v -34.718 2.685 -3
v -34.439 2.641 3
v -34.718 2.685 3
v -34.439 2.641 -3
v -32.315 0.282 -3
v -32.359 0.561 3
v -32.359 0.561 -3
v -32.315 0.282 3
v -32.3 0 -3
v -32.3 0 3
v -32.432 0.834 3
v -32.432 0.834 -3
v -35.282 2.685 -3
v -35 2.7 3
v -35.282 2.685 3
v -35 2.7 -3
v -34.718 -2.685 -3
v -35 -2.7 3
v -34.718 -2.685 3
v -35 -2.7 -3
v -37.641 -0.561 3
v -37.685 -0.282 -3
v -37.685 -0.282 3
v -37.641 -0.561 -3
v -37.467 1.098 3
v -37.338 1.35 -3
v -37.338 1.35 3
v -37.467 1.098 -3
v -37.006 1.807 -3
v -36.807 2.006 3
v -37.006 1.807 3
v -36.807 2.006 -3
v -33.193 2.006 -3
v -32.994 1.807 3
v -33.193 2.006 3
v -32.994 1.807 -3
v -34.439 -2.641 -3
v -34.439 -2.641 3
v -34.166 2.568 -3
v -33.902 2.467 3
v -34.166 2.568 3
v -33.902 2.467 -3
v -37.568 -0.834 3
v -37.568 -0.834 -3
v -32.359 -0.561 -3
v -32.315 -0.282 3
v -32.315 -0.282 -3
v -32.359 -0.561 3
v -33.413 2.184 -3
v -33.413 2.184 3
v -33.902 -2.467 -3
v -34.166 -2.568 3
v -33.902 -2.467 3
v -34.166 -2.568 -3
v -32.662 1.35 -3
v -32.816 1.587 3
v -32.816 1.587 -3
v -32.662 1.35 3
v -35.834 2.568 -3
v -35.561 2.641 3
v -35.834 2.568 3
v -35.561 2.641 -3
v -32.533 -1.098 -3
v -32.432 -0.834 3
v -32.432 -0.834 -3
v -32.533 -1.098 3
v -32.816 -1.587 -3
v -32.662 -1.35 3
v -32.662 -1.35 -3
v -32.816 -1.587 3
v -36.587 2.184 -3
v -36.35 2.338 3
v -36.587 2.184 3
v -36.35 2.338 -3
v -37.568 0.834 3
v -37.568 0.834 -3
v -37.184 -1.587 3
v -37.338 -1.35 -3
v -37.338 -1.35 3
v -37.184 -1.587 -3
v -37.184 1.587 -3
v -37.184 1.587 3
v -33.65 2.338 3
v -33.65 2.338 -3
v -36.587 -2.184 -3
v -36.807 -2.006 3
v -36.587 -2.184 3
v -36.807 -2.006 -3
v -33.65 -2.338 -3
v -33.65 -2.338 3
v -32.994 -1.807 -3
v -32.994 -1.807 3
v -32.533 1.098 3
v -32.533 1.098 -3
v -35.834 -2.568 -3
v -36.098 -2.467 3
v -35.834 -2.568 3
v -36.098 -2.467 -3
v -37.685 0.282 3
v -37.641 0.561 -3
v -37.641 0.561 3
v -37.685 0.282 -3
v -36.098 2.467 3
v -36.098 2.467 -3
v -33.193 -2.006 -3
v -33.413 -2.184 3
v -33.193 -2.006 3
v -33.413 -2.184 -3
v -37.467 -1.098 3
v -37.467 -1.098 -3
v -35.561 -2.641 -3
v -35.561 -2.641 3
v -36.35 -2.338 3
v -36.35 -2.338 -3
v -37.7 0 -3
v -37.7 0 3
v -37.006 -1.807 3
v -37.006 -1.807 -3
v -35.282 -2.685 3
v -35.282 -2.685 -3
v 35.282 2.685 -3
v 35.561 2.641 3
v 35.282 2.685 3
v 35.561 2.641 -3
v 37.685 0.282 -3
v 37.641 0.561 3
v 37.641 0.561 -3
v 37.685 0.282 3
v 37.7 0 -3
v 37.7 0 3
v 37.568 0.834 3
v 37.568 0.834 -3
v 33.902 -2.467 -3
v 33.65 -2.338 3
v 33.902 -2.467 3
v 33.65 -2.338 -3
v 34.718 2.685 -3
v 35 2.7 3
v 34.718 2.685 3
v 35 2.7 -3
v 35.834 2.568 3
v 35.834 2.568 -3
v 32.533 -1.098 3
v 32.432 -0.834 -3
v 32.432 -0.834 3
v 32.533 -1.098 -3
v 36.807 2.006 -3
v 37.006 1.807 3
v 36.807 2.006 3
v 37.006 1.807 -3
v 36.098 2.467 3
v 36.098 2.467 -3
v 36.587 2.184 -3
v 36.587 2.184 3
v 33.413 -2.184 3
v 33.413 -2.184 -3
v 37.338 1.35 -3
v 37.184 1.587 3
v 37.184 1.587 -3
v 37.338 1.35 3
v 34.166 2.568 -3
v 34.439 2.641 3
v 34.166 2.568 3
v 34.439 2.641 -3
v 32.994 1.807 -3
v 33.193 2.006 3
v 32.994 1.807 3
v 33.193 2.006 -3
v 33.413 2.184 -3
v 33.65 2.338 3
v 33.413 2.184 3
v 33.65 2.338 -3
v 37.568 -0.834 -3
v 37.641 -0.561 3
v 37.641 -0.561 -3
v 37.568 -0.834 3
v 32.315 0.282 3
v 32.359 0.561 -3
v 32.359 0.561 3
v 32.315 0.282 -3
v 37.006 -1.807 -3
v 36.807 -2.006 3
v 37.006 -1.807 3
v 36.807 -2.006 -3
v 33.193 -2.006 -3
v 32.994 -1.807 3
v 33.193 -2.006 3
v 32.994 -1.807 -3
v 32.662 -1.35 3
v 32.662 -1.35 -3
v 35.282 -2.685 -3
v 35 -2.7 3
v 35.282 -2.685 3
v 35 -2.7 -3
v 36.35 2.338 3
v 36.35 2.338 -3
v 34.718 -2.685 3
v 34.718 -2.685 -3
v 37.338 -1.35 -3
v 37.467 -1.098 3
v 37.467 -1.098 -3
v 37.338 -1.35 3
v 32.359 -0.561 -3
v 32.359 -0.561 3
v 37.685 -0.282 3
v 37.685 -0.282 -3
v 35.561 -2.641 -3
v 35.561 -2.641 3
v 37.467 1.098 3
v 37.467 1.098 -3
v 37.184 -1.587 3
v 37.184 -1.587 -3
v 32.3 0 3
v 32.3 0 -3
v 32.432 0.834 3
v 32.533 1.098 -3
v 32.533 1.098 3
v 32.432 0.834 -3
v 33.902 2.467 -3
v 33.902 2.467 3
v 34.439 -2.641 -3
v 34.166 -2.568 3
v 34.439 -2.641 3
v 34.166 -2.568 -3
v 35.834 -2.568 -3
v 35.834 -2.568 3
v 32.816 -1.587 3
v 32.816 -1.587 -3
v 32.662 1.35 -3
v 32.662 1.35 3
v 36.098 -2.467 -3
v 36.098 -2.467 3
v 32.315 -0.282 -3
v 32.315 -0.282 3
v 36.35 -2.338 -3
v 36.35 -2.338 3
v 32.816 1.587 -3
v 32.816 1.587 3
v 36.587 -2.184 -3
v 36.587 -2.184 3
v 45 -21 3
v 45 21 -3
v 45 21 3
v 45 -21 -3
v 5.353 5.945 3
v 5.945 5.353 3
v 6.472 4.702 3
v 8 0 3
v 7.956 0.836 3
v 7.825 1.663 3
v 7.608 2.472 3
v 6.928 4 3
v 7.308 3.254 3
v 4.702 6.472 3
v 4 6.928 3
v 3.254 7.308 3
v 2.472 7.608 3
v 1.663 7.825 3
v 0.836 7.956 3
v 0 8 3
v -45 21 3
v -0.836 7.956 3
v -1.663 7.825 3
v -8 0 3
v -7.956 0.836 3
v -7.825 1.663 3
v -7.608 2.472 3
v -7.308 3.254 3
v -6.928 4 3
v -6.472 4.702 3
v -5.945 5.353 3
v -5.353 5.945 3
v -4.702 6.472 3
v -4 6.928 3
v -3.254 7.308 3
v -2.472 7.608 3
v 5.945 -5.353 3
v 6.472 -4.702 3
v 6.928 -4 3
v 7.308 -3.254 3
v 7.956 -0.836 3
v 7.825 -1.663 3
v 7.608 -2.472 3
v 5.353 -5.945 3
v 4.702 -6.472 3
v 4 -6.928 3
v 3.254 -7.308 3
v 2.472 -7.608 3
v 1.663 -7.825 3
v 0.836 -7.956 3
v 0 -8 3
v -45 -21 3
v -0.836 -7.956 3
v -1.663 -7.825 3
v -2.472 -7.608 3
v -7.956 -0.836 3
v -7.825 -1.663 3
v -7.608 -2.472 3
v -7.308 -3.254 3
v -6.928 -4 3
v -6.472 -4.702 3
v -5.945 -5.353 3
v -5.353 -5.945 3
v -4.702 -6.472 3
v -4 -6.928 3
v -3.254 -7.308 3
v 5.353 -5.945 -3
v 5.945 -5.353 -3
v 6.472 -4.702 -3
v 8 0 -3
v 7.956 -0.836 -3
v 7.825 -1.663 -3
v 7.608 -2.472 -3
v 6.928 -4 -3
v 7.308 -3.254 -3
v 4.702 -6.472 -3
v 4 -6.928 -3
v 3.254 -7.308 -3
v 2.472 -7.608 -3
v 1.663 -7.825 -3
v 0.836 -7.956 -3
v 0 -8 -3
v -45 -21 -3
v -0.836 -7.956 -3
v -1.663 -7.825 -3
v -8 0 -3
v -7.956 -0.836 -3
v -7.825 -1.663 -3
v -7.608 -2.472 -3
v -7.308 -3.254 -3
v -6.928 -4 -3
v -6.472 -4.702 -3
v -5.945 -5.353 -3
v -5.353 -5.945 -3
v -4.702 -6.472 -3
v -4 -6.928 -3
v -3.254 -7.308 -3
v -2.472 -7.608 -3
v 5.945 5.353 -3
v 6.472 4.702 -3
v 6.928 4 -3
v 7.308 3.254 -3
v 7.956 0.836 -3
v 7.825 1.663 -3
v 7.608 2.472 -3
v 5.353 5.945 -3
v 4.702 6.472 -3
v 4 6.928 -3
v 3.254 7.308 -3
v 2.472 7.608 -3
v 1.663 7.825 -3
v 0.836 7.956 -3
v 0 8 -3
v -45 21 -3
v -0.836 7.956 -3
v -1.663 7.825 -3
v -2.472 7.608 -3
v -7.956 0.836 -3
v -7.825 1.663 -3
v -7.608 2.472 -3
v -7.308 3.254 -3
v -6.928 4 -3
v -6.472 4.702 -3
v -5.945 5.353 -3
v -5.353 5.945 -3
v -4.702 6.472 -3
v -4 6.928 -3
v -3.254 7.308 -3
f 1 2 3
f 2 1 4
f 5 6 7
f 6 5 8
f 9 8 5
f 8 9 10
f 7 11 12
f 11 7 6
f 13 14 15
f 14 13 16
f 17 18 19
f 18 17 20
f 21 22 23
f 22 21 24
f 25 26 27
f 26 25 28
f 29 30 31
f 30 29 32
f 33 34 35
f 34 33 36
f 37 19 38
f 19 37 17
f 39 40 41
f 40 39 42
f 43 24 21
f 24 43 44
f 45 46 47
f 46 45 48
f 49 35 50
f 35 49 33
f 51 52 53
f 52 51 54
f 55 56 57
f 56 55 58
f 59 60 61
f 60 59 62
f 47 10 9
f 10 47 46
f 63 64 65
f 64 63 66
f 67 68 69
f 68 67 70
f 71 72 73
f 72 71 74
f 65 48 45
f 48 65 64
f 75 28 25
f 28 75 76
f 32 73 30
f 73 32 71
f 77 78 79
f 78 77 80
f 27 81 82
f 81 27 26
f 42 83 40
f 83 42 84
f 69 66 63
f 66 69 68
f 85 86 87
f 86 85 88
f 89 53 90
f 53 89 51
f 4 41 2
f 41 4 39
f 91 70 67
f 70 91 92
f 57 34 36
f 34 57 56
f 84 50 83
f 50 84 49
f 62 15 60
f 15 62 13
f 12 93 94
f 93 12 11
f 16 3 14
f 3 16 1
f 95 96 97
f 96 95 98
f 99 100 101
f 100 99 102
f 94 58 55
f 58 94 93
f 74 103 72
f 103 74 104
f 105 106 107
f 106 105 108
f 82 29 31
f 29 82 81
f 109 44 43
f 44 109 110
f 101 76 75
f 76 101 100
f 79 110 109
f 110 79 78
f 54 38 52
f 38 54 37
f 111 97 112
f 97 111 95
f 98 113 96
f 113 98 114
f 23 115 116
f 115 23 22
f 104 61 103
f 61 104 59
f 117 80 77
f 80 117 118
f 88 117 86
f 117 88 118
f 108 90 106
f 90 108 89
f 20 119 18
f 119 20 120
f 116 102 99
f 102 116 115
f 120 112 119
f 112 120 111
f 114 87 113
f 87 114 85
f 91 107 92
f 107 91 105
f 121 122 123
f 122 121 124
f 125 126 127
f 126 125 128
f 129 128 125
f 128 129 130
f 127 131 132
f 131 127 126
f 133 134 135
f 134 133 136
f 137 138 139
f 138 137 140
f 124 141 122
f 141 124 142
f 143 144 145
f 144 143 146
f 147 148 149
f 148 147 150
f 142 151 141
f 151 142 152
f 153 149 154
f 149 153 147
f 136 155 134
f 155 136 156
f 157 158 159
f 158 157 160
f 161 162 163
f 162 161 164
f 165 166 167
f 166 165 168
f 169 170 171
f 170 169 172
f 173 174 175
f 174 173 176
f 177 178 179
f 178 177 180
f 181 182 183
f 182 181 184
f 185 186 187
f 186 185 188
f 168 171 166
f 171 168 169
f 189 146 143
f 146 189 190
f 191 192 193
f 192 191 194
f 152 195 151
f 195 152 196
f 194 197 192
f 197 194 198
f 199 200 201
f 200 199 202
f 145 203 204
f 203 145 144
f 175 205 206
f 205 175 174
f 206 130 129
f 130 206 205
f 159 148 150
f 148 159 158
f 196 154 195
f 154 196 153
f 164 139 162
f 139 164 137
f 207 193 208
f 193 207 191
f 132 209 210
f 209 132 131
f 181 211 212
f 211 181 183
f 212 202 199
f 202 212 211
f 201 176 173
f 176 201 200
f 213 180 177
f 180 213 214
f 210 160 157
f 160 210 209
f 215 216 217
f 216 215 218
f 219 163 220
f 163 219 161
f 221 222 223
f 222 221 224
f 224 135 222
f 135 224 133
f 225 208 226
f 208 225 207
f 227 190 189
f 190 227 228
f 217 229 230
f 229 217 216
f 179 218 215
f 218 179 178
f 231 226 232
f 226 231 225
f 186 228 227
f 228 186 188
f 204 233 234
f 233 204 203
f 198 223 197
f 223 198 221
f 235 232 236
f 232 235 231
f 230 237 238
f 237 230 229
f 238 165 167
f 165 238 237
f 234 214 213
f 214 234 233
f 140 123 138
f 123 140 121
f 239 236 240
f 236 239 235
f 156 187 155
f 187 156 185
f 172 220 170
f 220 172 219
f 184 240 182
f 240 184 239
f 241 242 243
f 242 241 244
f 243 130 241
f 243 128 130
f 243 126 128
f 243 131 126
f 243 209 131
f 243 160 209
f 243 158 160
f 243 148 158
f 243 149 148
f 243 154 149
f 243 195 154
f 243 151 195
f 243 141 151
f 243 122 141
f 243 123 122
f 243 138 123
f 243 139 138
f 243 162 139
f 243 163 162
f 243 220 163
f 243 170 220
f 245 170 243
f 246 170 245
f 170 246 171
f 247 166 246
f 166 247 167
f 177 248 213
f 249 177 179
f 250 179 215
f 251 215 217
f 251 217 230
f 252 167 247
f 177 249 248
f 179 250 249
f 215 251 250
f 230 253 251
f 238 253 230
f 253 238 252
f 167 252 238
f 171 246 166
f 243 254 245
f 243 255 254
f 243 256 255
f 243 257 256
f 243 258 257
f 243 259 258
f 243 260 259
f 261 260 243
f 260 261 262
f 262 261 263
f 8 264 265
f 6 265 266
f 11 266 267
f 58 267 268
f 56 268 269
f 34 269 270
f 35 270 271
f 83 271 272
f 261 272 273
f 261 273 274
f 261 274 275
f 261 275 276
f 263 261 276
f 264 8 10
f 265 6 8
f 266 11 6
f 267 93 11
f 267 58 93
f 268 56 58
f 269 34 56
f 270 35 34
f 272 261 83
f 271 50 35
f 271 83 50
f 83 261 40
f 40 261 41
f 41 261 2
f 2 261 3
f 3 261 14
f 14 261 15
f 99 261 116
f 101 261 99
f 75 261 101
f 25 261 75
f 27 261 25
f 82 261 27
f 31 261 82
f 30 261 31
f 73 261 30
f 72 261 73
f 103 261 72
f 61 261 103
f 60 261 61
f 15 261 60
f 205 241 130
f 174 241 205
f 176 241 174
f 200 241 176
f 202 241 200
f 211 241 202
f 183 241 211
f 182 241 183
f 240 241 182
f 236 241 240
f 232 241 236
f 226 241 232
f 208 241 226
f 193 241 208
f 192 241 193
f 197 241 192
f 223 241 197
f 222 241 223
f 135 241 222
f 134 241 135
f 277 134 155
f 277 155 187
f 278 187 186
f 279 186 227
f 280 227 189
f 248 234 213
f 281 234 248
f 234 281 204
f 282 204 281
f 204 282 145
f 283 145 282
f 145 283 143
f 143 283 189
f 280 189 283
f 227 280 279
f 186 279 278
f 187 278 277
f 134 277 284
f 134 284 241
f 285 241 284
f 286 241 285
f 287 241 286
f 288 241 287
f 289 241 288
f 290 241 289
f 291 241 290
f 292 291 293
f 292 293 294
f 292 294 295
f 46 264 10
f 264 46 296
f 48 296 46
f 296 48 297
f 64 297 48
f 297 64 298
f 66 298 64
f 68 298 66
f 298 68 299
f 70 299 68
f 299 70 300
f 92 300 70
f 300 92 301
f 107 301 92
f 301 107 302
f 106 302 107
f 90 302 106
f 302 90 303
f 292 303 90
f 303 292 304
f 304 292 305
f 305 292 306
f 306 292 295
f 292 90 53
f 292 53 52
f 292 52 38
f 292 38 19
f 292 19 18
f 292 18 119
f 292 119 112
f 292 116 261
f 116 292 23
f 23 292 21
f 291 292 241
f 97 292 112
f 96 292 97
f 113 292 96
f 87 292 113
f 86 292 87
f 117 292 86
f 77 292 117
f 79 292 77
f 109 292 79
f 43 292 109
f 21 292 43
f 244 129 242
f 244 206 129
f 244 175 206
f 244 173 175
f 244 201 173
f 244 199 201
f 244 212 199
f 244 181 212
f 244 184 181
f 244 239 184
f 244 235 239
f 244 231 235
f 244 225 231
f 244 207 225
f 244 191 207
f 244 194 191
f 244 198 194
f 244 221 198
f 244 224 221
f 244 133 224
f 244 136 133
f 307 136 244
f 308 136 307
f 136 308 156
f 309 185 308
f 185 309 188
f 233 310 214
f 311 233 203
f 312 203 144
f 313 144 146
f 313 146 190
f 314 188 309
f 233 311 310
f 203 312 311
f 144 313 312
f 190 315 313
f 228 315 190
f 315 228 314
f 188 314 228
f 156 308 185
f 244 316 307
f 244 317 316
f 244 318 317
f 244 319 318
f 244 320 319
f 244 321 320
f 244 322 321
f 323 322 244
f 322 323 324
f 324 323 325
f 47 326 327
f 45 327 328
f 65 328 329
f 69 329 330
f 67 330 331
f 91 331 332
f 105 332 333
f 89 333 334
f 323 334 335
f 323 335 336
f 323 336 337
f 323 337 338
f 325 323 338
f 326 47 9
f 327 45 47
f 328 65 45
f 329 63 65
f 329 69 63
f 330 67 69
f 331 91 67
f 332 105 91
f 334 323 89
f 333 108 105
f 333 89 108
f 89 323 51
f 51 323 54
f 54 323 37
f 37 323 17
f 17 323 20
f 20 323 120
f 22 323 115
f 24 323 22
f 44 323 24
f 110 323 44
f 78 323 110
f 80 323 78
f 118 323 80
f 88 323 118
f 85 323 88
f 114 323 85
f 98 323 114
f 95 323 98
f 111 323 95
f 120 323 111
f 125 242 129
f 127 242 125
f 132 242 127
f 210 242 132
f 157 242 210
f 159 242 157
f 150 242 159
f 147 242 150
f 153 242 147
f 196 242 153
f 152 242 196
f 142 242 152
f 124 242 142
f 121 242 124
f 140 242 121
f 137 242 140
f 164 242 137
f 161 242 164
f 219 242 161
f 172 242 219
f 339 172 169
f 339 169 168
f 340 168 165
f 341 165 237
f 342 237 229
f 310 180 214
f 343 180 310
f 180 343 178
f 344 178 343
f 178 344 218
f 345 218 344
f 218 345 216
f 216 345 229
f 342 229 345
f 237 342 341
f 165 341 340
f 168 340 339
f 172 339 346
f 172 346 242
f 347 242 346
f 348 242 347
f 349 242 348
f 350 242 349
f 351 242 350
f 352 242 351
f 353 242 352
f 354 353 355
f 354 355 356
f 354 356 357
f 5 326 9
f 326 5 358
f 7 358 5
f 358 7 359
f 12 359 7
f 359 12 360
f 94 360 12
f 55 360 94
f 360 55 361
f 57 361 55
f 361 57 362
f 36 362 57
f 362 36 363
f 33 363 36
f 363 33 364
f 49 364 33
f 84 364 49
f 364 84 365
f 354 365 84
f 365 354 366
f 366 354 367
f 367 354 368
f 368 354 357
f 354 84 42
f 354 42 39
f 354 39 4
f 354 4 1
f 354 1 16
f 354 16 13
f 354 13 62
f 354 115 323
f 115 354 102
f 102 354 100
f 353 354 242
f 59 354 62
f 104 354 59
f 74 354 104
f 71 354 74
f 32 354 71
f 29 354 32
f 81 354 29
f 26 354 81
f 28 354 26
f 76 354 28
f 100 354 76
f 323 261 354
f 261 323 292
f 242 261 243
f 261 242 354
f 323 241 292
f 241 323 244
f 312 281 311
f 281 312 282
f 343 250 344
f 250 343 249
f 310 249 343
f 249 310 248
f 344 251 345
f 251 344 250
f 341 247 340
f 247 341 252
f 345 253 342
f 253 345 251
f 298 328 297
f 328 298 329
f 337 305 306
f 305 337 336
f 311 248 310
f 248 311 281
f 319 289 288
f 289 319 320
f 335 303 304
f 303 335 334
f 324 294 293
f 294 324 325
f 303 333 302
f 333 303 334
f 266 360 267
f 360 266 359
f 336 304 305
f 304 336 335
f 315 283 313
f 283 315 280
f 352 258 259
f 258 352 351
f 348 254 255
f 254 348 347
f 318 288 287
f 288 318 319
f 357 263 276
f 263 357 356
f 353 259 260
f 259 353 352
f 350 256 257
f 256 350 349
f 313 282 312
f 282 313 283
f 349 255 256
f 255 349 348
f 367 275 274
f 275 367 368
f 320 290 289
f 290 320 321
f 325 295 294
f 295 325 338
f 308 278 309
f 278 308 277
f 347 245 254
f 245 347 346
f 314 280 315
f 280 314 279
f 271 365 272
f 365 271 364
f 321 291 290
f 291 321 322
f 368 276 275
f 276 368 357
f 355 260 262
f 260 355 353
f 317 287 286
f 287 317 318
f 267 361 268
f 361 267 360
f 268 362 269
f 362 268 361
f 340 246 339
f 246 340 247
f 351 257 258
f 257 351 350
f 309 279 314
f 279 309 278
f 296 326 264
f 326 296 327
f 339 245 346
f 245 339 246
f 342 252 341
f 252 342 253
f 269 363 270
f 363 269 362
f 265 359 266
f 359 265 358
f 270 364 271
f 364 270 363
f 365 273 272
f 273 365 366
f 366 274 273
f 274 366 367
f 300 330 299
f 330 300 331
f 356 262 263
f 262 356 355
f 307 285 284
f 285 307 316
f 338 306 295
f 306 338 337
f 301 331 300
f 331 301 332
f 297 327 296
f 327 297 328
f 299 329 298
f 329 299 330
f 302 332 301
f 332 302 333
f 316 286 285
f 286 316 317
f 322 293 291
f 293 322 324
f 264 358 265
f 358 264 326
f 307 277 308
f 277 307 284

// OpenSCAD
// Rod-end mounting plate.
$fn = 60;
eps = 0.02;
plate_l = 90;
plate_w = 42;
plate_t = 6;
bore_d = 16;
difference() {
    cube([plate_l, plate_w, plate_t], center = true);
    translate([0, 0, -plate_t / 2 - eps]) cylinder(d = bore_d, h = plate_t + 2 * eps);
    for (x = [-plate_l / 2 + 10, plate_l / 2 - 10])
        translate([x, 0, -plate_t / 2 - eps]) cylinder(d = 5.4, h = plate_t + 2 * eps);
}
